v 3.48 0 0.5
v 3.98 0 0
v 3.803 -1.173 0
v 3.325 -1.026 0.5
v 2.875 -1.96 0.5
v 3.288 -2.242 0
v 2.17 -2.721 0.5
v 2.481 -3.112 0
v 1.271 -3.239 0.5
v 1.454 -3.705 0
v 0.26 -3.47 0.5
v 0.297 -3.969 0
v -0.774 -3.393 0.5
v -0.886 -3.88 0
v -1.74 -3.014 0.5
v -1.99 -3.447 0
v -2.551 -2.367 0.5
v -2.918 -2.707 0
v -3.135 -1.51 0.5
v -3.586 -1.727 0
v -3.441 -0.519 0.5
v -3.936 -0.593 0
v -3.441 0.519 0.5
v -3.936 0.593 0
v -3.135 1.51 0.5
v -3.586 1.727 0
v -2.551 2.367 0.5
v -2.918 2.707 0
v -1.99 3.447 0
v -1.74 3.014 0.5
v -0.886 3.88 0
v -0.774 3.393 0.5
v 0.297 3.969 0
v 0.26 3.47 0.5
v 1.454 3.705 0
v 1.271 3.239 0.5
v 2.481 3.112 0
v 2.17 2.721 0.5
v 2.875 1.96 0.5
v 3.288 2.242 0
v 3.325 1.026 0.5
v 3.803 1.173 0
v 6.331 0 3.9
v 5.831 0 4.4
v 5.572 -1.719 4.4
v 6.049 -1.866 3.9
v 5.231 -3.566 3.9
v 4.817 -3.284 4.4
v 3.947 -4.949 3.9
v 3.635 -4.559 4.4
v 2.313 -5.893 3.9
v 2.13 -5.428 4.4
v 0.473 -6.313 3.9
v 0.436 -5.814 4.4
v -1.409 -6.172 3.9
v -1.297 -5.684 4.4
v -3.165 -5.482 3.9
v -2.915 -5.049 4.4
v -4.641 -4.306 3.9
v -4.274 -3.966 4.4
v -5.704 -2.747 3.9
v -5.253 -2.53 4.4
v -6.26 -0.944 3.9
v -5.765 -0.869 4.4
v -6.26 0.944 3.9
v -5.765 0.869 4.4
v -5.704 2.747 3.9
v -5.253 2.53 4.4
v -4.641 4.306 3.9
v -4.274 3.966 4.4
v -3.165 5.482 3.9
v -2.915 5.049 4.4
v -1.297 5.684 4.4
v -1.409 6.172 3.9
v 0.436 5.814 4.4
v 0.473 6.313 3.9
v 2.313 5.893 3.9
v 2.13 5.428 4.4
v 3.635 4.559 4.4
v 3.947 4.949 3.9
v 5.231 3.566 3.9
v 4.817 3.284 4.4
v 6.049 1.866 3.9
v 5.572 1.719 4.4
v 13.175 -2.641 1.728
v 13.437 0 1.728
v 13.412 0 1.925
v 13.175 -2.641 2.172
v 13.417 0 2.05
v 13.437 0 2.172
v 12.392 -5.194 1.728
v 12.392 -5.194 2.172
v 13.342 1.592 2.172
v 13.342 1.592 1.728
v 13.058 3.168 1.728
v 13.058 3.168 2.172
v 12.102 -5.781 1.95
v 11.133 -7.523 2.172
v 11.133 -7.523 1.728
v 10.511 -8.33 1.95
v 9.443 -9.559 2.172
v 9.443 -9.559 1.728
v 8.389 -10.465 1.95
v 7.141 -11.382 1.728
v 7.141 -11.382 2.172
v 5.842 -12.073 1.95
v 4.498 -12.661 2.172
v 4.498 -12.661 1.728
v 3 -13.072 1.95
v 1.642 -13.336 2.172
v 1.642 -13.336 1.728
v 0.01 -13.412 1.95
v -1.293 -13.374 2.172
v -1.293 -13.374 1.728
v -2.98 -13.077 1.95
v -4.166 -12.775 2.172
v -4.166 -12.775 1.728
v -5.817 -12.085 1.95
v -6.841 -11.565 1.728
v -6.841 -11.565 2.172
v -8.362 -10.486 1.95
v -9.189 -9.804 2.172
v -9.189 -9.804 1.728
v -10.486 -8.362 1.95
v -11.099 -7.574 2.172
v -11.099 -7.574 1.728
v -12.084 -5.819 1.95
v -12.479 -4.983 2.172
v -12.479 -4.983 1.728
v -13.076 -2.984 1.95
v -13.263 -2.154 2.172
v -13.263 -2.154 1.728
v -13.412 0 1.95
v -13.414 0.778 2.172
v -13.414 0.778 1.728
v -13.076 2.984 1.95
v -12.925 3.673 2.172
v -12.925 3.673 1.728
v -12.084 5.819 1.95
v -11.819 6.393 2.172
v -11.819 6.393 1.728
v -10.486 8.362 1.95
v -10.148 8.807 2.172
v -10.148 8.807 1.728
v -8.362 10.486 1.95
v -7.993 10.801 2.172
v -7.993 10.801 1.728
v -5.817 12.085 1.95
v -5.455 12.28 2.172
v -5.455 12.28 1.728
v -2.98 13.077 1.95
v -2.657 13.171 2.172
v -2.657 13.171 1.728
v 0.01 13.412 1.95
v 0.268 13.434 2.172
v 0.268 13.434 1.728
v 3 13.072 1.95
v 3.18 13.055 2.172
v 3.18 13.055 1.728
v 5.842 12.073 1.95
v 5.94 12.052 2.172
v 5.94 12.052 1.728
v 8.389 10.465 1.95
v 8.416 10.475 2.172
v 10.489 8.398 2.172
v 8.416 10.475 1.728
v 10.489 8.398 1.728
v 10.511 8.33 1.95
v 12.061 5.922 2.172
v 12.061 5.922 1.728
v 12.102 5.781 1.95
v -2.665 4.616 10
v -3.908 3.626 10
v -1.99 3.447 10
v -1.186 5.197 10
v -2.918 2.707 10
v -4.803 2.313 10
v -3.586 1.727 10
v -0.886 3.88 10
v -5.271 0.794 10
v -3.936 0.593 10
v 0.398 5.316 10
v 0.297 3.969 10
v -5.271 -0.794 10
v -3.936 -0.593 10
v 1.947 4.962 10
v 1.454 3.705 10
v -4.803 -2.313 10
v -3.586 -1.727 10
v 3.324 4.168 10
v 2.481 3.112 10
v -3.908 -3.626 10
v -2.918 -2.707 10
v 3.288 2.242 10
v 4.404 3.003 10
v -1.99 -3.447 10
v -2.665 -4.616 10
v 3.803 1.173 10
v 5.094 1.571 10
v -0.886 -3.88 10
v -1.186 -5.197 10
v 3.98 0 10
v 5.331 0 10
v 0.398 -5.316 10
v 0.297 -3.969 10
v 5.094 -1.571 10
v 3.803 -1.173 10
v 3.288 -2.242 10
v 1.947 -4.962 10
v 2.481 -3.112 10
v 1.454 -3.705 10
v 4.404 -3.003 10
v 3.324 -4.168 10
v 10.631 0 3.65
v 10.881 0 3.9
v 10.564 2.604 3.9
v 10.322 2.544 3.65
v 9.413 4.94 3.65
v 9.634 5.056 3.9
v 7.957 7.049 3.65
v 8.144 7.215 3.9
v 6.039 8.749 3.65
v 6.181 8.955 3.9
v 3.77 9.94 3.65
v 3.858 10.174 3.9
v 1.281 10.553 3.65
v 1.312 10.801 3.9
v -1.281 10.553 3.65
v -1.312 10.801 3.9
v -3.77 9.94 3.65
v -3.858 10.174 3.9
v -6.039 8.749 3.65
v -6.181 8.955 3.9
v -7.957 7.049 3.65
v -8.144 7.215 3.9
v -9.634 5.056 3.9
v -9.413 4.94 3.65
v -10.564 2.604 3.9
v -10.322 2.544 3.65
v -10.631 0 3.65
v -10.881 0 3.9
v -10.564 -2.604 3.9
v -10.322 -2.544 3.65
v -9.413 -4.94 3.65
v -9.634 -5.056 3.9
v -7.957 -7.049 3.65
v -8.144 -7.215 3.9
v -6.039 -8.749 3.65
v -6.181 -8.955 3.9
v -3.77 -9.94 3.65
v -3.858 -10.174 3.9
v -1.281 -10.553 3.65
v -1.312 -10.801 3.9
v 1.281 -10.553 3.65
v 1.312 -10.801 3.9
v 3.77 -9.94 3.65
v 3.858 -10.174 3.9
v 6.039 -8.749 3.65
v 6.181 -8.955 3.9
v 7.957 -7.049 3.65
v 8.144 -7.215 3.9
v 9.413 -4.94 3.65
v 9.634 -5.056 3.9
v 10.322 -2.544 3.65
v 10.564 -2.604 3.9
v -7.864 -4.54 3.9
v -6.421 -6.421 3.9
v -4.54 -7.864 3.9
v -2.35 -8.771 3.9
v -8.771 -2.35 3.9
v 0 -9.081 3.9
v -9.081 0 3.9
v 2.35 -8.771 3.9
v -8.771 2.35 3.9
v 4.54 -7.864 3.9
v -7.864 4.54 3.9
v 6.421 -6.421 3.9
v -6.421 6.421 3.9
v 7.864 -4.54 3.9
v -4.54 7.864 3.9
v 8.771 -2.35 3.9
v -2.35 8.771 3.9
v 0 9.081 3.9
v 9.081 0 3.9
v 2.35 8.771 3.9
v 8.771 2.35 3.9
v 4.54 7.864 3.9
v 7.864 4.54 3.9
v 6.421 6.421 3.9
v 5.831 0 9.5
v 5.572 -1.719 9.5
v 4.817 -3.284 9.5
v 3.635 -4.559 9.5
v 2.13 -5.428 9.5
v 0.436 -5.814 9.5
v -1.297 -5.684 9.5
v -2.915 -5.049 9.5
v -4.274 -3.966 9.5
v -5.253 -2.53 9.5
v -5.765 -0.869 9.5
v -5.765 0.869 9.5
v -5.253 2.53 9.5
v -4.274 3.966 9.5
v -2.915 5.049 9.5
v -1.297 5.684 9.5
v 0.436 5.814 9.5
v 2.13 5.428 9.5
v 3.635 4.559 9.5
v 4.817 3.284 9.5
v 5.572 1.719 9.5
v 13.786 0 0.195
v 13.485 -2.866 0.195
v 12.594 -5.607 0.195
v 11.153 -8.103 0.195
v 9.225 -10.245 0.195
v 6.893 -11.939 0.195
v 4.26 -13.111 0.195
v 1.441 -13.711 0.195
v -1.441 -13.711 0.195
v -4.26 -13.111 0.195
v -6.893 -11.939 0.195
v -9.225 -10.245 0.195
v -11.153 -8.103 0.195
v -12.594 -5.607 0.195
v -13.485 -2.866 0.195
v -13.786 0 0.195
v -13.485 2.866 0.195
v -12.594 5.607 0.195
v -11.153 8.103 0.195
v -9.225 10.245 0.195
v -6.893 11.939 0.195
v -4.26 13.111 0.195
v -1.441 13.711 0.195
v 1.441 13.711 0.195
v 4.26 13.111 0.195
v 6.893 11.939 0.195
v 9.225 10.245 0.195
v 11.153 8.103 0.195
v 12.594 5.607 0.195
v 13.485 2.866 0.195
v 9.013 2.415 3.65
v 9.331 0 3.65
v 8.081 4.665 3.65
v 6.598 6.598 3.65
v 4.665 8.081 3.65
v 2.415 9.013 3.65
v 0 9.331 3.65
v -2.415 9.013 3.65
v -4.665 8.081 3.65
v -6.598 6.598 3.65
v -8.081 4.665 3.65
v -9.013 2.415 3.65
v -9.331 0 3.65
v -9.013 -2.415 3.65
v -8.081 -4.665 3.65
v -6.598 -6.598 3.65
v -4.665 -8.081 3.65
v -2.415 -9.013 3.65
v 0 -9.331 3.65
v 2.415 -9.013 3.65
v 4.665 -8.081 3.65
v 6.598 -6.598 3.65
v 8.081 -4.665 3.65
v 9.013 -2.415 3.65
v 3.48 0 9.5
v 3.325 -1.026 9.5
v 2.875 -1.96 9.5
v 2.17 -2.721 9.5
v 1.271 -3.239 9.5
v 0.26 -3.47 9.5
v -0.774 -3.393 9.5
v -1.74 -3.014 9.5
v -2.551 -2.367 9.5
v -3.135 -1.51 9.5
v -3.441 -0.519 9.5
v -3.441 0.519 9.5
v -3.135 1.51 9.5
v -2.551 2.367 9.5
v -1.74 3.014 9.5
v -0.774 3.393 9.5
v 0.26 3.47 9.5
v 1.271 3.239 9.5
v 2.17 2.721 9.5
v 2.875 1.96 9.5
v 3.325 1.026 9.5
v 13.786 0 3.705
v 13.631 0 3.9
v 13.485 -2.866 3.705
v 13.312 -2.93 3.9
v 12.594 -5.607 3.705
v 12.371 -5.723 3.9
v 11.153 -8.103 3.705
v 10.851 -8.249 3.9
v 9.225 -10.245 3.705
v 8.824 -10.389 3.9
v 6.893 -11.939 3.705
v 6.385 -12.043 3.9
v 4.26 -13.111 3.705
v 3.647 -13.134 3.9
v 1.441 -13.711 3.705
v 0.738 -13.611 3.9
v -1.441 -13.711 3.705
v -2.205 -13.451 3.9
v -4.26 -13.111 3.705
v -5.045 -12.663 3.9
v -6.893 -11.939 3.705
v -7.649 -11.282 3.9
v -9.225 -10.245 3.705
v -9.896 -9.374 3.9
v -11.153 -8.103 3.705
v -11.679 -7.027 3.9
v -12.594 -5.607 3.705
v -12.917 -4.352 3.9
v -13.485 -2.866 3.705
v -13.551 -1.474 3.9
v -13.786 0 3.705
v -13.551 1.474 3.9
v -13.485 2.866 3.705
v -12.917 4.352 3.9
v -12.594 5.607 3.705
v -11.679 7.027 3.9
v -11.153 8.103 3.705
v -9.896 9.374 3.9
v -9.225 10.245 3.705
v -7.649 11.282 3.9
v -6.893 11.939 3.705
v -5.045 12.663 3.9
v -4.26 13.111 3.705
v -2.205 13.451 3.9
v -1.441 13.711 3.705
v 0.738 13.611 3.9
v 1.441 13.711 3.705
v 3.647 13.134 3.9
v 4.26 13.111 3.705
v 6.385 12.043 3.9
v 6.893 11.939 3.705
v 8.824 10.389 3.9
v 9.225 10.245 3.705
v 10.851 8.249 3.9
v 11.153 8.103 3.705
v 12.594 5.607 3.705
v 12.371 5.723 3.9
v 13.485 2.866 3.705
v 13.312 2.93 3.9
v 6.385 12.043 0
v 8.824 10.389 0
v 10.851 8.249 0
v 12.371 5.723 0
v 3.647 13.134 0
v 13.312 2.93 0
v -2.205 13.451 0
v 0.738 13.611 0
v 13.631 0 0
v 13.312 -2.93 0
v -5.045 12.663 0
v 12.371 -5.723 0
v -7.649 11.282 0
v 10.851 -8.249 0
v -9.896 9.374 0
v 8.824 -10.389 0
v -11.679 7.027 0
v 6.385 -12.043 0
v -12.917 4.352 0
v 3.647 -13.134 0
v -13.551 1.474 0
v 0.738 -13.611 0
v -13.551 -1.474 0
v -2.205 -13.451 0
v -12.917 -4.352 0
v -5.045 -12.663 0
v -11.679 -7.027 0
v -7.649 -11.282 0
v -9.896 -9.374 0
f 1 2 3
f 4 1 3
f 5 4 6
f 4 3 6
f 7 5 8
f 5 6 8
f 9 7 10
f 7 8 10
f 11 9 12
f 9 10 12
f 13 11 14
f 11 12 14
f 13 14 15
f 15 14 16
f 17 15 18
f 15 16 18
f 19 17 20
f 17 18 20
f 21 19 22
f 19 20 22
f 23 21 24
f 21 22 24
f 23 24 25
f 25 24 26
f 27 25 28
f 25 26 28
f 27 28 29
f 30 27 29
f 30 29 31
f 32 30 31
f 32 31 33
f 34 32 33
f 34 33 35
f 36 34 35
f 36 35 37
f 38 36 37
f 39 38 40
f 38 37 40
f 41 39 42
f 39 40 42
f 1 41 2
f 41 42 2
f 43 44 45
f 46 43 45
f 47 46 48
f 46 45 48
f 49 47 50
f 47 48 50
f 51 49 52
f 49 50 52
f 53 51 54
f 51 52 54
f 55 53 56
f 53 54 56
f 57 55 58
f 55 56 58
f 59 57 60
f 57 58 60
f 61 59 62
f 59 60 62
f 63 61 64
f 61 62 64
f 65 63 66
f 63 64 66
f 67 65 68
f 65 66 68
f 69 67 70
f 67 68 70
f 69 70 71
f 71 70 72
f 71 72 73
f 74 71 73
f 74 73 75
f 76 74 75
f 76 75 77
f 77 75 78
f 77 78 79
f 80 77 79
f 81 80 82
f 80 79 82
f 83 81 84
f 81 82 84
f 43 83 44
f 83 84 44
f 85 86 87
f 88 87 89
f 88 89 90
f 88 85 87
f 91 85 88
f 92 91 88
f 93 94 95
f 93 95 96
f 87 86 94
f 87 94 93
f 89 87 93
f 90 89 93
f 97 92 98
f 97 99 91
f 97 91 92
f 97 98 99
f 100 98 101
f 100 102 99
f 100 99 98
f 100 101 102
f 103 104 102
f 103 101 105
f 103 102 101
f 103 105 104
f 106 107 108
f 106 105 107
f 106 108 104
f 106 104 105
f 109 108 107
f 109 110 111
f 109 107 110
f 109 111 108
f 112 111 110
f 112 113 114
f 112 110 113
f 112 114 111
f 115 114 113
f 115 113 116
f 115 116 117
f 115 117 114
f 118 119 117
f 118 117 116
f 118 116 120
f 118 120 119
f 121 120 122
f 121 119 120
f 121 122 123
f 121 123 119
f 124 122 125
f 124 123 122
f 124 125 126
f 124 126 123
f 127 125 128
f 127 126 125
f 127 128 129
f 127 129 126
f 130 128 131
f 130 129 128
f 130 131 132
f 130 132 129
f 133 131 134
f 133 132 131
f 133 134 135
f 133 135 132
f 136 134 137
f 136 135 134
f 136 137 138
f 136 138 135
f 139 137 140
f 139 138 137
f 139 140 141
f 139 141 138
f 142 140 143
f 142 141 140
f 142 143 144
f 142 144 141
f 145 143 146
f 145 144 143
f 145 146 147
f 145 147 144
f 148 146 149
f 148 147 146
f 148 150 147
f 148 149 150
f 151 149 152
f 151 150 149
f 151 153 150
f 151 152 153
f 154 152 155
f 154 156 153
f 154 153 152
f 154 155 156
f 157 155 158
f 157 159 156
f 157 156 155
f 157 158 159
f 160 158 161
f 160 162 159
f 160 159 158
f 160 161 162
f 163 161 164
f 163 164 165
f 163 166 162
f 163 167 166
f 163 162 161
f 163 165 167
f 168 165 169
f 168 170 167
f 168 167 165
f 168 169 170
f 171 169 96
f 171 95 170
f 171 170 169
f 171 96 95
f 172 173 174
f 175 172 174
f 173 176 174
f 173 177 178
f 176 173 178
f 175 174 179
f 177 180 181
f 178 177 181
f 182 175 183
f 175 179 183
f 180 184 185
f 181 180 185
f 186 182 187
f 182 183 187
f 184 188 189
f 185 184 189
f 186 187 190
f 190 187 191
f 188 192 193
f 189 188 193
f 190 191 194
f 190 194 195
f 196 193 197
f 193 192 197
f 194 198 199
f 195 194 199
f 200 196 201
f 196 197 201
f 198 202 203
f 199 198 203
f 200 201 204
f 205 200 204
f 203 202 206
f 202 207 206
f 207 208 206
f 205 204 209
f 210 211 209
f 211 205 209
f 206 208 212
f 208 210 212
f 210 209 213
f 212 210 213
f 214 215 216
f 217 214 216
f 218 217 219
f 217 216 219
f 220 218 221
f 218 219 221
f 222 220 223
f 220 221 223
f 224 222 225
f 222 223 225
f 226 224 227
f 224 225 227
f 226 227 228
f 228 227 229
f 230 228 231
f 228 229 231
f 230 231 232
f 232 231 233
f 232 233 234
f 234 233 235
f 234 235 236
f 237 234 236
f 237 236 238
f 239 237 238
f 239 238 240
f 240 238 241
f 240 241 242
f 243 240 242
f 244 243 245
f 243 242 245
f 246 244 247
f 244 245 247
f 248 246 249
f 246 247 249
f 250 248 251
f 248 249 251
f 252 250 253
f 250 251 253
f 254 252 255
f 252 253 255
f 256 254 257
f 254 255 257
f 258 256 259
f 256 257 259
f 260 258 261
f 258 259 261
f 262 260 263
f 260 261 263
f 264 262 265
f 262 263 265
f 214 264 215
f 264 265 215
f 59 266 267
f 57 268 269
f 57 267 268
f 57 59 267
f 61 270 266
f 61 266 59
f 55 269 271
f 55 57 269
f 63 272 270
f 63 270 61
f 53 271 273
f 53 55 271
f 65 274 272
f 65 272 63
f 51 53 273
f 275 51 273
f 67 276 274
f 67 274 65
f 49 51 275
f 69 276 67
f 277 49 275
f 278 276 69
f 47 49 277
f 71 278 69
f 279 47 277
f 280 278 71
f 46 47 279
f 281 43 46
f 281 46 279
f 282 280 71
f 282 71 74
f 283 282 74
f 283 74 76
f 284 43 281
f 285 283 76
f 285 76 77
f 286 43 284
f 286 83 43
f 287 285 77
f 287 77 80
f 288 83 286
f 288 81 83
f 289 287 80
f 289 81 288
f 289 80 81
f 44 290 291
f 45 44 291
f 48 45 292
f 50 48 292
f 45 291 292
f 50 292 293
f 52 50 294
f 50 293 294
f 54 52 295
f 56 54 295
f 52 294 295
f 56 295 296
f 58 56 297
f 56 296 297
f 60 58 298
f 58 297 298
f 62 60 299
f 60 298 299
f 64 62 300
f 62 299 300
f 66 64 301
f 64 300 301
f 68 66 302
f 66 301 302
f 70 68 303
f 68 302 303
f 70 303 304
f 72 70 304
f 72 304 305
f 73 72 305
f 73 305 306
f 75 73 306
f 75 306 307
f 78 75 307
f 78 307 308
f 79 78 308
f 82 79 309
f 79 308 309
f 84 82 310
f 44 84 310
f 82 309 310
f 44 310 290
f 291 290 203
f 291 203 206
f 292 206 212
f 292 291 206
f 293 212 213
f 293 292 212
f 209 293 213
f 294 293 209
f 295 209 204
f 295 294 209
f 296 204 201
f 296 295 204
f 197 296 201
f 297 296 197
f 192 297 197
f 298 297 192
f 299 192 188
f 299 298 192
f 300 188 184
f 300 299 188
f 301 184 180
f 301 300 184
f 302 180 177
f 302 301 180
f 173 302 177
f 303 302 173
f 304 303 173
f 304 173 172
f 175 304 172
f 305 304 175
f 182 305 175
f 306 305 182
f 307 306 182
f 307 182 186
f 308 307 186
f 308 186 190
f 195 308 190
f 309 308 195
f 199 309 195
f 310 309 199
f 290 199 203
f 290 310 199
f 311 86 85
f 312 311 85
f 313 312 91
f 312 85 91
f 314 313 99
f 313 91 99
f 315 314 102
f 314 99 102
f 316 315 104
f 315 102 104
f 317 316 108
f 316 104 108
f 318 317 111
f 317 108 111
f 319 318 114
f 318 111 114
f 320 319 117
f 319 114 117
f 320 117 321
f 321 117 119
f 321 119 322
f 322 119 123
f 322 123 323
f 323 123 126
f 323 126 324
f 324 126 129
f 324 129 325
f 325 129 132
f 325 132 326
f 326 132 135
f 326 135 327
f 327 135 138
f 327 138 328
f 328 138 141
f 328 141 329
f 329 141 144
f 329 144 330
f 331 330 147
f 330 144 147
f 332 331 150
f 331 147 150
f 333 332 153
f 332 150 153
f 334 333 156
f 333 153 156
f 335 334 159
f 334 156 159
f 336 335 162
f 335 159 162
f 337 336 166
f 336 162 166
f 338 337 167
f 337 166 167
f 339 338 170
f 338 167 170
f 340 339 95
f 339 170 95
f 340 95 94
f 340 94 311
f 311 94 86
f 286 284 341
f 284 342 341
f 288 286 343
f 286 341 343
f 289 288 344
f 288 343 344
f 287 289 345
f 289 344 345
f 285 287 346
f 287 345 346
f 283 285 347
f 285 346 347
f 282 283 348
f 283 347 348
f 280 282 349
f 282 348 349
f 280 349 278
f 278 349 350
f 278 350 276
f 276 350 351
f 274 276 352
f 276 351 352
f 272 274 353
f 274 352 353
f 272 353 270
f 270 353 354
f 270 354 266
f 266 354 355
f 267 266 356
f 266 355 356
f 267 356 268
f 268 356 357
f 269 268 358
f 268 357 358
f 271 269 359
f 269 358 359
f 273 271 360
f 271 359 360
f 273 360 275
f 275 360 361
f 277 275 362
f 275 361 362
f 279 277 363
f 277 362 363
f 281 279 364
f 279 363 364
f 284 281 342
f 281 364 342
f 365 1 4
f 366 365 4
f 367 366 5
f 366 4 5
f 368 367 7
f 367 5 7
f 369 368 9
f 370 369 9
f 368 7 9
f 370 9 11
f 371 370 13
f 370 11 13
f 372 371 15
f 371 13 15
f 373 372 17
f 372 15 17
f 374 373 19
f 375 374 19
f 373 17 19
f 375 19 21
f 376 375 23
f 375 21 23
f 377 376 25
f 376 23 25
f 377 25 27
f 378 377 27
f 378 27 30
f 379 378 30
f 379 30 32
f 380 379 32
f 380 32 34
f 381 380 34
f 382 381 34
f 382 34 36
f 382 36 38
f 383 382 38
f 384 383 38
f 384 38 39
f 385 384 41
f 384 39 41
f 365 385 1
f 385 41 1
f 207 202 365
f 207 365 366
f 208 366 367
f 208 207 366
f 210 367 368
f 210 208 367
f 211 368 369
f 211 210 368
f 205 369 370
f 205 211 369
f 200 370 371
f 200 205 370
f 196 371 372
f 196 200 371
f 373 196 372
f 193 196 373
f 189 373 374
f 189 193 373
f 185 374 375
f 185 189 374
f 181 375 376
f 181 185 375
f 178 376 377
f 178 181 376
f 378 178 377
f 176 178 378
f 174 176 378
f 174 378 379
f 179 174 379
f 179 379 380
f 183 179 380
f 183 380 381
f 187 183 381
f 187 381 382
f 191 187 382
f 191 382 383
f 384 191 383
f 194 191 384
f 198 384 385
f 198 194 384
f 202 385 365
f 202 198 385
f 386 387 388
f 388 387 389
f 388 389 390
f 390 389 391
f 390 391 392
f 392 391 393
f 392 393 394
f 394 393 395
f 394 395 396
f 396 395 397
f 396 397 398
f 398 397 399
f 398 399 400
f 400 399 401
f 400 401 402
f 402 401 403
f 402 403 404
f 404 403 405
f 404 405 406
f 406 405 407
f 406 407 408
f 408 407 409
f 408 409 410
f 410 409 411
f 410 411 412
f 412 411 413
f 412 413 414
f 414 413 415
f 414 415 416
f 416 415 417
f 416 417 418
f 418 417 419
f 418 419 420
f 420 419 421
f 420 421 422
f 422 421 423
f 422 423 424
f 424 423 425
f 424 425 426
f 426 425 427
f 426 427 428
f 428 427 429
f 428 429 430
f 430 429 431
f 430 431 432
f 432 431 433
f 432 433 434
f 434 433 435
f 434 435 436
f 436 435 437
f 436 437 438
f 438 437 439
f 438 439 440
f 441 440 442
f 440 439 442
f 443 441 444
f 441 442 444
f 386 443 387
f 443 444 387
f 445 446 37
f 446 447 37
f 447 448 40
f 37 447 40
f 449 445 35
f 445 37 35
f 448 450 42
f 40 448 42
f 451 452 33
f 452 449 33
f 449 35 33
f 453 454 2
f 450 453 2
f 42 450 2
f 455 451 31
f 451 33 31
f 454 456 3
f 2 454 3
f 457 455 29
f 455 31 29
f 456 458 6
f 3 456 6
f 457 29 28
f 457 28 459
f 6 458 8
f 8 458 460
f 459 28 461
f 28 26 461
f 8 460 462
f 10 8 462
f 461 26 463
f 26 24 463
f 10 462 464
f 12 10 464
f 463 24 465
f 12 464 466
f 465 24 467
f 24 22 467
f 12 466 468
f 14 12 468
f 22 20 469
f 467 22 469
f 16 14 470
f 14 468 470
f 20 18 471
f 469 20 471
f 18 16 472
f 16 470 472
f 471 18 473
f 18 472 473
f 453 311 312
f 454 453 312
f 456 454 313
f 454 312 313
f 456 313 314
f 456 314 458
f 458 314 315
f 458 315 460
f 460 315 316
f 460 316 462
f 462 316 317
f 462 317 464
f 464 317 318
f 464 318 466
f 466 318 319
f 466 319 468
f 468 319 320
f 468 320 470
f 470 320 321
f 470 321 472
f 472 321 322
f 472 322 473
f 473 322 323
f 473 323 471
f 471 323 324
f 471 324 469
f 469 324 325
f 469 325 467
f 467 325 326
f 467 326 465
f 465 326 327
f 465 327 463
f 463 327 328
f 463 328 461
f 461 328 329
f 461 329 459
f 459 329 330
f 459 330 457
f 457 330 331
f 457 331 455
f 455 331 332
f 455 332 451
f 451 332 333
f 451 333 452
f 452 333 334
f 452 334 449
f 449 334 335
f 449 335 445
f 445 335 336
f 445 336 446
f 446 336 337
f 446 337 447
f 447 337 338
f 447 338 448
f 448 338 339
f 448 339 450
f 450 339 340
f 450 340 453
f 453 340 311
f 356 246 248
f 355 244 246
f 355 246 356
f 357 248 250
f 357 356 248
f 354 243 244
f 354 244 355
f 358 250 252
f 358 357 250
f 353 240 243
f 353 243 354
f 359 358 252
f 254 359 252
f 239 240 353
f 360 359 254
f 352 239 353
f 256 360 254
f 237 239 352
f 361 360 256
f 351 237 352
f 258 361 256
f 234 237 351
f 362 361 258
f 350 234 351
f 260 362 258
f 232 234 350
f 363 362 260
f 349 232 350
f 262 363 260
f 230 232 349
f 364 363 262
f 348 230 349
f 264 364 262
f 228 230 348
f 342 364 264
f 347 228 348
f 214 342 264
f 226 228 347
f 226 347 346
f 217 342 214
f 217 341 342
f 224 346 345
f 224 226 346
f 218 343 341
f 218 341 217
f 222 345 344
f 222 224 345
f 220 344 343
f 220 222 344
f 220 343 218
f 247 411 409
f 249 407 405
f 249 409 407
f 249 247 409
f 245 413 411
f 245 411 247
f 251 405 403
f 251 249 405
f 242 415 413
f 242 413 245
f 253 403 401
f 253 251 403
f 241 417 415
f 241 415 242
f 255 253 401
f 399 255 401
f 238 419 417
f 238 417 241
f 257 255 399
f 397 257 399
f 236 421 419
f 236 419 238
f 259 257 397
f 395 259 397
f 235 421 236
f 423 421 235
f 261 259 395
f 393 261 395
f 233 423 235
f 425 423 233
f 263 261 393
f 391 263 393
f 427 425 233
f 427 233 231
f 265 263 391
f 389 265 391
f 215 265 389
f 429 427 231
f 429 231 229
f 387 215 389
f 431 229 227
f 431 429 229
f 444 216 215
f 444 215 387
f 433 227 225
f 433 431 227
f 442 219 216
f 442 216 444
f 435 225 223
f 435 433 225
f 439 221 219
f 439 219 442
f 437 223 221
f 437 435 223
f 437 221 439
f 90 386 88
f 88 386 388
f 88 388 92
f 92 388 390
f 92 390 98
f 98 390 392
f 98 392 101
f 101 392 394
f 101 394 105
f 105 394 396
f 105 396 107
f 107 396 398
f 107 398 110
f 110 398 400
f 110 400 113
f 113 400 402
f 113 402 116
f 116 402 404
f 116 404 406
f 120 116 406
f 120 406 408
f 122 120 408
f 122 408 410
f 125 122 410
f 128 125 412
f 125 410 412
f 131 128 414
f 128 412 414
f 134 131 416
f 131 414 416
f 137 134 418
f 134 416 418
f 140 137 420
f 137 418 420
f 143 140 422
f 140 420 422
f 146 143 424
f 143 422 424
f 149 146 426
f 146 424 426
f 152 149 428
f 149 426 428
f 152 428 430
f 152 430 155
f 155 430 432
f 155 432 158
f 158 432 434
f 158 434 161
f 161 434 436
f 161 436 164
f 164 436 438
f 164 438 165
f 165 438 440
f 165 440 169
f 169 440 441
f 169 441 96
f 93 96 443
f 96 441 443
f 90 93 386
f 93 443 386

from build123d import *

# Parameters (mm, degrees)
F2_SIZE  = 0.2
F3_R     = 1
F4_SIZE  = 0.5
F5_SIZE  = 0.5
F6_R     = 11.6305905431
F6_R_2   = 8.3305905431
F7_DEPTH = 0.25


# Not quite as in the source:
# - a fillet or chamfer that OpenCascade refuses, or shapes differently, is made with other operations: its cross-section is extruded or revolved along the edge and cut away or added


with BuildPart() as f1:
    # F0 (on Front) → F1 (revolve)
    with BuildSketch(Plane.XZ):
        Polygon((5.8305905431, 10), (3.48, 10), (3.48, 0), (5.8305905431, 0), (13.8305905431, 0), (13.3861808223, 1.95), (13.8305905431, 3.9), (5.8305905431, 3.9), align=None)
    revolve(axis=Axis((0, 0, 13.5622331873), (0, 0, -1)))

    # F2
    f2_edges = [f1.edges().sort_by_distance(p)[0] for p in [
        (-13.830591, 0, 3.9),
        (-13.830591, 0, 0),
    ]]
    chamfer(f2_edges, length=F2_SIZE)

    # F3
    f3_edges = [f1.edges().sort_by_distance(p)[0] for p in [
        (-13.386181, 0, 1.95),
    ]]
    fillet(f3_edges, radius=F3_R)

    # F4
    f4_edges = [f1.edges().sort_by_distance(p)[0] for p in [
        (-5.830591, 0, 10),
        (-3.48, 0, 10),
        (-5.830591, 0, 3.9),
    ]]
    chamfer(f4_edges, length=F4_SIZE)

    # F5
    f5_edges = [f1.edges().sort_by_distance(p)[0] for p in [
        (-3.48, 0, 0),
    ]]
    chamfer(f5_edges, length=F5_SIZE)

    # F6 (on face) → F7 (cut)
    with BuildSketch(Plane.XY.offset(3.9)):
        Circle(F6_R)
        Circle(F6_R_2, mode=Mode.SUBTRACT)
    extrude(amount=-F7_DEPTH, mode=Mode.SUBTRACT)

    # F8: chamfer of 1 on 2 edges, made by hand


with BuildPart() as f8_tool2:
    # F8_s3 → F8_t4 (revolve)
    with BuildSketch(Plane.XZ):
        Polygon((10.6305905431, 3.65), (11.6305905431, 4.65), (11.6305905431, 3.65), align=None)
    revolve(axis=Axis((0, 0, 3.65), (0, 0, 1)))

    split(bisect_by=Plane.XY.offset(3.9), keep=Keep.BOTTOM)


with BuildPart() as f1_1:
    add(f1.part)

    # F8_t1: union F8_tool2
    add(f8_tool2.part)


with BuildPart() as f8_tool7:
    # F8_s8 → F8_t9 (revolve)
    with BuildSketch(Plane.XZ):
        Polygon((8.3305905431, 4.65), (9.3305905431, 3.65), (8.3305905431, 3.65), align=None)
    revolve(axis=Axis((0, 0, 3.65), (0, 0, 1)))

    split(bisect_by=Plane.XY.offset(3.9), keep=Keep.BOTTOM)


with BuildPart() as f1_2:
    add(f1_1.part)

    # F8_t6: union F8_tool7
    add(f8_tool7.part)


solid = f1_2.part
